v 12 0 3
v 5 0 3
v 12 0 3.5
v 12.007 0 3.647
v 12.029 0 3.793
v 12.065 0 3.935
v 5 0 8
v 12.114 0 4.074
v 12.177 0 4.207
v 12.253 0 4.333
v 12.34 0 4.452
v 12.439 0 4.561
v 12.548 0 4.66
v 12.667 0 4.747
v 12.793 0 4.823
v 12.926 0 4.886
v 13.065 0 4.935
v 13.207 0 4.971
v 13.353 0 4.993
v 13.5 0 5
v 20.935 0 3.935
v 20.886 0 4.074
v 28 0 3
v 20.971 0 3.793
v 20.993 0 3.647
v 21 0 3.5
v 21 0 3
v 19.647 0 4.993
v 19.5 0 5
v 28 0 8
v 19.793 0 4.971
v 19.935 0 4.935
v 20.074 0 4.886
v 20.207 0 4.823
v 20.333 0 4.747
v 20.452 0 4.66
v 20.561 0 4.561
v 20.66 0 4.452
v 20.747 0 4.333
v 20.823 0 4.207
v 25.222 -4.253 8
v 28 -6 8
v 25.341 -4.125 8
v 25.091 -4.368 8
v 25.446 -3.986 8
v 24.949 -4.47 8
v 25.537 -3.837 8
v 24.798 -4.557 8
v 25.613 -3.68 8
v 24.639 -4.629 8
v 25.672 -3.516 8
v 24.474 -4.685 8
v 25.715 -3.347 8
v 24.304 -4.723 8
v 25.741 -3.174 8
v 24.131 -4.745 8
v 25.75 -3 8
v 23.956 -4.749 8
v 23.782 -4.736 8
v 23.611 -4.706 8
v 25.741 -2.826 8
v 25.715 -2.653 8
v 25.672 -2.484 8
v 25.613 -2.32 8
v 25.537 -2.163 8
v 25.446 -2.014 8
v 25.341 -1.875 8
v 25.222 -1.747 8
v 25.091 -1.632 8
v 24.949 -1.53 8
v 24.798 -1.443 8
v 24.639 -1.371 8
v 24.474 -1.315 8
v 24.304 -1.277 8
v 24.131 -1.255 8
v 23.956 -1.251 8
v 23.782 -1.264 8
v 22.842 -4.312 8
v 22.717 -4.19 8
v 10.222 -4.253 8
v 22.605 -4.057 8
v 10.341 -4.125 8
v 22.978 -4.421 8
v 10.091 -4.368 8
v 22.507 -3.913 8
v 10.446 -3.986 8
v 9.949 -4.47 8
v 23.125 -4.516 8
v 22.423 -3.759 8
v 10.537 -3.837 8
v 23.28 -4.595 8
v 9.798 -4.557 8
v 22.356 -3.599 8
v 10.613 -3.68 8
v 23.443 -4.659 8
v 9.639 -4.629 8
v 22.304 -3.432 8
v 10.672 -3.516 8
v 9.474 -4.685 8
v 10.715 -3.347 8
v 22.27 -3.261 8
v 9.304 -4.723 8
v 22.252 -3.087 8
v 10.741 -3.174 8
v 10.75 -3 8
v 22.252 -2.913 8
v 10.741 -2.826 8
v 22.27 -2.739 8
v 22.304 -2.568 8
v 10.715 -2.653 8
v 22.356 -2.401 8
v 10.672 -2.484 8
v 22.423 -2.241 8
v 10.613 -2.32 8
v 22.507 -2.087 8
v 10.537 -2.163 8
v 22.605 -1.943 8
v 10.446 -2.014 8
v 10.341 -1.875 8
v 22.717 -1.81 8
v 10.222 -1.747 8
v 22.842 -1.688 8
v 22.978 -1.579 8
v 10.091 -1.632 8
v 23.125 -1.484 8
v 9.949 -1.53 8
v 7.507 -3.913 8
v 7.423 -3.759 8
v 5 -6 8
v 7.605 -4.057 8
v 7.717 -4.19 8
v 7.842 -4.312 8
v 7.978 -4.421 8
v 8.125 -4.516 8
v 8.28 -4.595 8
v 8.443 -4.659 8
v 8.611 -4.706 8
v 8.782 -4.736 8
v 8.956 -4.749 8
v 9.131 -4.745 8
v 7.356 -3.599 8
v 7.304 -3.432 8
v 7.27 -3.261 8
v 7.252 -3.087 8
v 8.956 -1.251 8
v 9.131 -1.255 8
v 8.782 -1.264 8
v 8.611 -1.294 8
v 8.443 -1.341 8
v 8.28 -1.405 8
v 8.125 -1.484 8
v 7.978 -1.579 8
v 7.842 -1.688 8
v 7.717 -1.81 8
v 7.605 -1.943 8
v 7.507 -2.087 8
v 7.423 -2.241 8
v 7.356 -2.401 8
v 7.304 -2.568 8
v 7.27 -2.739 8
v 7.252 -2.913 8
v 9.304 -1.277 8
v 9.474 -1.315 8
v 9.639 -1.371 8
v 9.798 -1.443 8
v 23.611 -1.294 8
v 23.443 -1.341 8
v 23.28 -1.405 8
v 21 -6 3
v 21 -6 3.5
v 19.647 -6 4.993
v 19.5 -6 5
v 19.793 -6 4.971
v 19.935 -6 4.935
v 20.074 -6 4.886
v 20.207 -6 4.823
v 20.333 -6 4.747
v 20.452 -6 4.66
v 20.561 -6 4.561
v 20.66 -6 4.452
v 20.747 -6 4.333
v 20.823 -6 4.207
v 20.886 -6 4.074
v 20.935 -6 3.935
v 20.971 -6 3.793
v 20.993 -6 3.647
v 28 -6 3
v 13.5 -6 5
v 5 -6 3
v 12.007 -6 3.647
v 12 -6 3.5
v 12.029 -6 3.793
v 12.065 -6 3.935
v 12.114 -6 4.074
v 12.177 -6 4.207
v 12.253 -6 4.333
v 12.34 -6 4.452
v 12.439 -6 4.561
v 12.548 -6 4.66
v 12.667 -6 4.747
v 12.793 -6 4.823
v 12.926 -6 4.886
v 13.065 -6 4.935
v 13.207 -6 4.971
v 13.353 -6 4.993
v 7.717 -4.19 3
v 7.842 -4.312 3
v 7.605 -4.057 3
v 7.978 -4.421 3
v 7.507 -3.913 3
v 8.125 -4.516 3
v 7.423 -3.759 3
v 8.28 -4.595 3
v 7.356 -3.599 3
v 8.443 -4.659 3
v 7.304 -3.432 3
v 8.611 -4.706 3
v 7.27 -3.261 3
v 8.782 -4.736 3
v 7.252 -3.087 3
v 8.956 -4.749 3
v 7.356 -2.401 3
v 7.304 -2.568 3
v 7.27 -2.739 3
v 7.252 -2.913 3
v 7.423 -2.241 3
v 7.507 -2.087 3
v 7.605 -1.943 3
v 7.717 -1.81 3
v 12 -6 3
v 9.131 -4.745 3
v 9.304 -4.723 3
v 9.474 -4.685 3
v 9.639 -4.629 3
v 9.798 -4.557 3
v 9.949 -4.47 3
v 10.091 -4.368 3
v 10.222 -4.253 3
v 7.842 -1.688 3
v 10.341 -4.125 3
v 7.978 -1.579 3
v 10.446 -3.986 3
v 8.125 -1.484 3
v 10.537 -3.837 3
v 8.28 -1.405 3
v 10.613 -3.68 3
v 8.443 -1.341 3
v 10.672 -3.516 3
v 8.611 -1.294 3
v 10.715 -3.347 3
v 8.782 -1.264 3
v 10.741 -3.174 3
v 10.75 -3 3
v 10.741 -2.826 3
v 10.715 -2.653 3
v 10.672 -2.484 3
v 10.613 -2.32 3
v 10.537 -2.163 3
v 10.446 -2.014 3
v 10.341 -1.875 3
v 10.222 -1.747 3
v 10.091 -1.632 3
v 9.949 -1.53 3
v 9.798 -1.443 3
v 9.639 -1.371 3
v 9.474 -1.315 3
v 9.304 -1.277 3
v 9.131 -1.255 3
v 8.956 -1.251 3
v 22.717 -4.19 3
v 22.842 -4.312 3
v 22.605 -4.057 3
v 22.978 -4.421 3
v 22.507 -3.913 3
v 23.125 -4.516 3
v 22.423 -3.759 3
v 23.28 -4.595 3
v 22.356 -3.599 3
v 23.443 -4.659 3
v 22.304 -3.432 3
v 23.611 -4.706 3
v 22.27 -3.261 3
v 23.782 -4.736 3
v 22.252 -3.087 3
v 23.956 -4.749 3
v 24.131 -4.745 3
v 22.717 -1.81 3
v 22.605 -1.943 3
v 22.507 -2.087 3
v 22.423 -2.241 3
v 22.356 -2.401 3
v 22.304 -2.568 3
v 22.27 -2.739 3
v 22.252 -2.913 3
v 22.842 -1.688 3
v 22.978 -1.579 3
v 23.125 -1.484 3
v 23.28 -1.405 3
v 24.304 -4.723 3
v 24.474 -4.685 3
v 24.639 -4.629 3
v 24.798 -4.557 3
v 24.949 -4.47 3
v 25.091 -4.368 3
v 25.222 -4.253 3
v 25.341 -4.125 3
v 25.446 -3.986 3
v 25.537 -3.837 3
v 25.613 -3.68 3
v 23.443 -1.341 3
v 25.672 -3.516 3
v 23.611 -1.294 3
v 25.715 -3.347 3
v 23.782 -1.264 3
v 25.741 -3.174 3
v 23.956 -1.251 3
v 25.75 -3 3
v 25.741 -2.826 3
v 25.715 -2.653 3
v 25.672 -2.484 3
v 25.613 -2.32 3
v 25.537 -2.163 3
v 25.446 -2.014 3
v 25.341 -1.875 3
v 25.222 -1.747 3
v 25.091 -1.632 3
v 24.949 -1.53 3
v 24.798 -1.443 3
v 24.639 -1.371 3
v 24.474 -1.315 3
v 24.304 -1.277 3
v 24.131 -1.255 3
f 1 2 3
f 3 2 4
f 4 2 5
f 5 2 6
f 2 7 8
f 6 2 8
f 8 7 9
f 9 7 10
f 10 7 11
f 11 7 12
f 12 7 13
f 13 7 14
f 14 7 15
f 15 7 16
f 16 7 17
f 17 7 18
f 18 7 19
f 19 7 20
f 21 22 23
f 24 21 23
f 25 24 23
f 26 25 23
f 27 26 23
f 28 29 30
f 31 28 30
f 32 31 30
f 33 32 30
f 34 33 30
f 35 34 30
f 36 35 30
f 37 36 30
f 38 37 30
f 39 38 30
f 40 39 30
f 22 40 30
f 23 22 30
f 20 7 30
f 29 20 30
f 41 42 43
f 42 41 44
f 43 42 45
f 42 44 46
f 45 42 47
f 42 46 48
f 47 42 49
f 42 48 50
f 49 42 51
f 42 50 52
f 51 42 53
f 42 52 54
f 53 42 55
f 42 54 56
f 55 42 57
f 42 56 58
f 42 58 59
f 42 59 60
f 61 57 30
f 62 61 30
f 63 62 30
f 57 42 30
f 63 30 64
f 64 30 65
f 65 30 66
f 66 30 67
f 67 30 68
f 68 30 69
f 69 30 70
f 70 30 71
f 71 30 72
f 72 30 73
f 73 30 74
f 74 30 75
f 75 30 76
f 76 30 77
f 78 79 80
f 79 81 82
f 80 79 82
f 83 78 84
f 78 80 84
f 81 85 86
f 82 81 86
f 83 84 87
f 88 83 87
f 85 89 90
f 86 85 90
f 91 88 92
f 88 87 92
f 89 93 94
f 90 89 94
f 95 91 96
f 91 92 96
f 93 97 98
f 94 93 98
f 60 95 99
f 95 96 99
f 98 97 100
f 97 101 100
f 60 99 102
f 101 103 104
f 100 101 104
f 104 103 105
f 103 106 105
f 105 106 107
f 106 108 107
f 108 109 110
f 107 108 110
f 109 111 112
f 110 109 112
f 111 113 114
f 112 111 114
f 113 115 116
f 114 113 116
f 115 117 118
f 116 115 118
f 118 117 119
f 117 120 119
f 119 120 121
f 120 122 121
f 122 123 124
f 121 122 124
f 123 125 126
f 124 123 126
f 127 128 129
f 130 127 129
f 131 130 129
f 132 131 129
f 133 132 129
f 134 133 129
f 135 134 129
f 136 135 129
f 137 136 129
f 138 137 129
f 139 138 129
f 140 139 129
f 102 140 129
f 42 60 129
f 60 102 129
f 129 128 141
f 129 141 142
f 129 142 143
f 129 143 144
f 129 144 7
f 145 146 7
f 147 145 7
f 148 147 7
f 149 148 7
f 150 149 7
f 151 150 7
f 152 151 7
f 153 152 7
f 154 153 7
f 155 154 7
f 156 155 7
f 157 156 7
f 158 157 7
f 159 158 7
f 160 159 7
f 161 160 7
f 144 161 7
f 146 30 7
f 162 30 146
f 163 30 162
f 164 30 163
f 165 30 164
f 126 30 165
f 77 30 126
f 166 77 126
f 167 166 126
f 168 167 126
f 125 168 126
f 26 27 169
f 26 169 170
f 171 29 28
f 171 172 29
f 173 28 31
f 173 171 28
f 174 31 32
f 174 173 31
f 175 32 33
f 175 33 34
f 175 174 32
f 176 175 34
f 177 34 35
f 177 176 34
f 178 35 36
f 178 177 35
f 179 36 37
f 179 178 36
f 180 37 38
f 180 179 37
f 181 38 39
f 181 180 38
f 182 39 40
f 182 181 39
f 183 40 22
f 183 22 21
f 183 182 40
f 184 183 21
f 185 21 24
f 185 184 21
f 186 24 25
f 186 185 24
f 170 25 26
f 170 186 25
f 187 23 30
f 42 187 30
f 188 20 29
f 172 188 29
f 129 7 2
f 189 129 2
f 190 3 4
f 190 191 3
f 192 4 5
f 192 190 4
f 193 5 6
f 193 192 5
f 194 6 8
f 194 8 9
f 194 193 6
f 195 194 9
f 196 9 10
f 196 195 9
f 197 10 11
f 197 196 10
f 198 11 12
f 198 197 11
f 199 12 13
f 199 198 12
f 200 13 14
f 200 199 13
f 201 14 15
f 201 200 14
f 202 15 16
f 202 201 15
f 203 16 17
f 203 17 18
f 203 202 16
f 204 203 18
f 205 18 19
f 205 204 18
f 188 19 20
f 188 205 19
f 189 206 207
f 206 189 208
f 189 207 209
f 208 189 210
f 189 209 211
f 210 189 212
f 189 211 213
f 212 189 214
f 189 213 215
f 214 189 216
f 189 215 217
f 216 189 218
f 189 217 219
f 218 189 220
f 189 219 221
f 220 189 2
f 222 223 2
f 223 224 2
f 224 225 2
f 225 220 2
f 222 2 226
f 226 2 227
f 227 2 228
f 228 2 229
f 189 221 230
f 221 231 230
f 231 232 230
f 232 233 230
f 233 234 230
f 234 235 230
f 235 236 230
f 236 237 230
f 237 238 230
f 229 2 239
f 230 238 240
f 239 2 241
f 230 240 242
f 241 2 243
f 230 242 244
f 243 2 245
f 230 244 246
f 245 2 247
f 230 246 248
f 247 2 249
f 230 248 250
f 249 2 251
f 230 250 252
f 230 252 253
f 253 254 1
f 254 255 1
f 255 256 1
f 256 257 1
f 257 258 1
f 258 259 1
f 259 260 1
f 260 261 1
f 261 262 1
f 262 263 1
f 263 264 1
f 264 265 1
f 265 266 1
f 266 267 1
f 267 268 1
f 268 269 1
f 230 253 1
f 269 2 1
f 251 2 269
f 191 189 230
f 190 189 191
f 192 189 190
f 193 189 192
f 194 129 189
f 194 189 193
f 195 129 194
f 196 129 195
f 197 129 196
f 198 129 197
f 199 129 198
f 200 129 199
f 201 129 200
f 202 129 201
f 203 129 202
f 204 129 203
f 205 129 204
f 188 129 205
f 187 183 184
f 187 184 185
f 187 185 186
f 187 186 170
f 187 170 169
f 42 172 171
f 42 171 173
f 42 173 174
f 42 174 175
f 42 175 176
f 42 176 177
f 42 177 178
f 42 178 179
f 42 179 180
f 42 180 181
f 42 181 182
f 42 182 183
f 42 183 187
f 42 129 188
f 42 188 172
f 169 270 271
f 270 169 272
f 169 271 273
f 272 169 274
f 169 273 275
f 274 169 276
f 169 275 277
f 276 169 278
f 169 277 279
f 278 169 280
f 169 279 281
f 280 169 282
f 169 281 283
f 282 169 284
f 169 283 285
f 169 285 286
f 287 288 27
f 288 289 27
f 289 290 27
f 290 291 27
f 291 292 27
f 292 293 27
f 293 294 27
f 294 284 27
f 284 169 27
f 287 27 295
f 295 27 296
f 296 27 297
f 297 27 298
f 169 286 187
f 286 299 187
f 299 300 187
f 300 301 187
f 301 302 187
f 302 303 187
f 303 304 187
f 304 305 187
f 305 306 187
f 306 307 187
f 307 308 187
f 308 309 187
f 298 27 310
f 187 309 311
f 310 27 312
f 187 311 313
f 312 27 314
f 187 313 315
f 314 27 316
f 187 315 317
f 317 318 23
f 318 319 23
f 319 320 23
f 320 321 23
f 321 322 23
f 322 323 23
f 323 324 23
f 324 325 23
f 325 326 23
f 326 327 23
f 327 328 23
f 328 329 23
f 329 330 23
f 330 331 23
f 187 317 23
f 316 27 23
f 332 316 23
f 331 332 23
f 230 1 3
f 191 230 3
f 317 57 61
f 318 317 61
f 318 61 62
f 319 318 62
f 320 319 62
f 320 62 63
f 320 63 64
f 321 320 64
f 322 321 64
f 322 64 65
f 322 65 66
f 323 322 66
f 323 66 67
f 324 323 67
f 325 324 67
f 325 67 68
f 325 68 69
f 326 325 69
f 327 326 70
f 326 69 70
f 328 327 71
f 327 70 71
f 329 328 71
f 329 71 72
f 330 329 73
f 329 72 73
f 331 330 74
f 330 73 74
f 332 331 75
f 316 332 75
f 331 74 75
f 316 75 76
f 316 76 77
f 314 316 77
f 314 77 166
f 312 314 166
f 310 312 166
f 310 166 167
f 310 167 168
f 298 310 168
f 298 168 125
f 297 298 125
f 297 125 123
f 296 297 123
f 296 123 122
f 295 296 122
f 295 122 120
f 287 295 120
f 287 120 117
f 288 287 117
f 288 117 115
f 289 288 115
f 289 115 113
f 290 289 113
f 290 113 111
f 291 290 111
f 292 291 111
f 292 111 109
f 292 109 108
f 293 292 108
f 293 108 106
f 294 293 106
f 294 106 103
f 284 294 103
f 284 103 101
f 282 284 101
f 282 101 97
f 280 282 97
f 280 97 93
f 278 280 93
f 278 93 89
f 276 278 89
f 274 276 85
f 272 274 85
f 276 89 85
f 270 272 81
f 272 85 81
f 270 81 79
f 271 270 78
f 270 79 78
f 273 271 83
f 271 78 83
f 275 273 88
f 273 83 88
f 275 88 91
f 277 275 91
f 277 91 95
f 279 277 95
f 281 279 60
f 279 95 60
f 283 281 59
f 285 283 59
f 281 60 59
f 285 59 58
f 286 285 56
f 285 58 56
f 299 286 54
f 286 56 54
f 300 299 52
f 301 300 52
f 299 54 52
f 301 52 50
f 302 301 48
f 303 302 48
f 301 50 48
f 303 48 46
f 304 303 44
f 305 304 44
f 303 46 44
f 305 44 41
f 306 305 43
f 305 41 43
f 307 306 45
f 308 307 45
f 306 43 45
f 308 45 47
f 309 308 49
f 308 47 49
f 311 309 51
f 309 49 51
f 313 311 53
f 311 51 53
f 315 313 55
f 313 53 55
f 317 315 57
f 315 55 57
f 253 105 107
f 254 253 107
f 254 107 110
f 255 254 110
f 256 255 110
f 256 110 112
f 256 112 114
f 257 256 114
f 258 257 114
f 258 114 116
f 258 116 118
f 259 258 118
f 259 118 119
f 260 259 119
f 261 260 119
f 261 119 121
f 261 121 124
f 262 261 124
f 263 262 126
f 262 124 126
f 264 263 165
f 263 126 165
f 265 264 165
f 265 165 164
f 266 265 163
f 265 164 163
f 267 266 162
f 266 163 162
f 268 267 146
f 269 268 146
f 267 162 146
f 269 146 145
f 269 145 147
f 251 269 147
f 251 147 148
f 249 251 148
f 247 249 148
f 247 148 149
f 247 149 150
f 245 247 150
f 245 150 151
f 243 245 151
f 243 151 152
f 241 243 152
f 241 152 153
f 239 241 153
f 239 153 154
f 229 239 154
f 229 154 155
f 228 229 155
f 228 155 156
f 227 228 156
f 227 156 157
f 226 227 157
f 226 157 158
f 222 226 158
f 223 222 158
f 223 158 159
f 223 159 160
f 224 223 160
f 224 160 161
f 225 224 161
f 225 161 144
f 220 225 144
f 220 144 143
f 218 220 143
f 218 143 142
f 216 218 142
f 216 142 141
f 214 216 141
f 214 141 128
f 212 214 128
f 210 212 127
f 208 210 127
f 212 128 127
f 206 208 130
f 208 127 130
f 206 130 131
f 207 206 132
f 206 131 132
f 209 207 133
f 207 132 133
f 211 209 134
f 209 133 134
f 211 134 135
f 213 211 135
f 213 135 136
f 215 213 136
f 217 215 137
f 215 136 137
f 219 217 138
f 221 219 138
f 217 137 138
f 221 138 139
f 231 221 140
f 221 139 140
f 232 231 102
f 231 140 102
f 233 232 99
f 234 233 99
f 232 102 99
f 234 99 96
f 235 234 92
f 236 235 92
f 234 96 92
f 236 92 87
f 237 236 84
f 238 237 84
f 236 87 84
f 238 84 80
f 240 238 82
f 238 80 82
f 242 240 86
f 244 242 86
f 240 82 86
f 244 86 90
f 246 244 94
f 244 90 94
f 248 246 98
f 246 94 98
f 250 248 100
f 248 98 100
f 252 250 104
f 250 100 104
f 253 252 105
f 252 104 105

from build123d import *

# Parameters (mm, degrees)
F0_W     = 7
F0_H     = 2
F1_DEPTH = 6
F2_R     = 1.75
F3_DEPTH = 5.001
F4_R     = 1.5


with BuildPart() as f1:
    # F0 (on Front) → F1 (new body)
    with BuildSketch(Plane.XZ):
        Polygon((5, 8), (5, 5), (12, 5), (21, 5), (28, 5), (28, 8), align=None)
        with Locations((8.5, 4)):
            Rectangle(F0_W, F0_H)
        with Locations((24.5, 4)):
            Rectangle(F0_W, F0_H)
    extrude(amount=F1_DEPTH)

    # F2 (on face) → F3 (cut, through all)
    with BuildSketch(Plane.XY.offset(8)):
        with Locations((9, -3)):
            Circle(F2_R)
        with Locations((24, -3)):
            Circle(F2_R)
    extrude(amount=-F3_DEPTH, mode=Mode.SUBTRACT)

    # F4
    f4_edges = [f1.edges().sort_by_distance(p)[0] for p in [
        (12, -3, 5),
        (21, -3, 5),
    ]]
    fillet(f4_edges, radius=F4_R)


solid = f1.part
